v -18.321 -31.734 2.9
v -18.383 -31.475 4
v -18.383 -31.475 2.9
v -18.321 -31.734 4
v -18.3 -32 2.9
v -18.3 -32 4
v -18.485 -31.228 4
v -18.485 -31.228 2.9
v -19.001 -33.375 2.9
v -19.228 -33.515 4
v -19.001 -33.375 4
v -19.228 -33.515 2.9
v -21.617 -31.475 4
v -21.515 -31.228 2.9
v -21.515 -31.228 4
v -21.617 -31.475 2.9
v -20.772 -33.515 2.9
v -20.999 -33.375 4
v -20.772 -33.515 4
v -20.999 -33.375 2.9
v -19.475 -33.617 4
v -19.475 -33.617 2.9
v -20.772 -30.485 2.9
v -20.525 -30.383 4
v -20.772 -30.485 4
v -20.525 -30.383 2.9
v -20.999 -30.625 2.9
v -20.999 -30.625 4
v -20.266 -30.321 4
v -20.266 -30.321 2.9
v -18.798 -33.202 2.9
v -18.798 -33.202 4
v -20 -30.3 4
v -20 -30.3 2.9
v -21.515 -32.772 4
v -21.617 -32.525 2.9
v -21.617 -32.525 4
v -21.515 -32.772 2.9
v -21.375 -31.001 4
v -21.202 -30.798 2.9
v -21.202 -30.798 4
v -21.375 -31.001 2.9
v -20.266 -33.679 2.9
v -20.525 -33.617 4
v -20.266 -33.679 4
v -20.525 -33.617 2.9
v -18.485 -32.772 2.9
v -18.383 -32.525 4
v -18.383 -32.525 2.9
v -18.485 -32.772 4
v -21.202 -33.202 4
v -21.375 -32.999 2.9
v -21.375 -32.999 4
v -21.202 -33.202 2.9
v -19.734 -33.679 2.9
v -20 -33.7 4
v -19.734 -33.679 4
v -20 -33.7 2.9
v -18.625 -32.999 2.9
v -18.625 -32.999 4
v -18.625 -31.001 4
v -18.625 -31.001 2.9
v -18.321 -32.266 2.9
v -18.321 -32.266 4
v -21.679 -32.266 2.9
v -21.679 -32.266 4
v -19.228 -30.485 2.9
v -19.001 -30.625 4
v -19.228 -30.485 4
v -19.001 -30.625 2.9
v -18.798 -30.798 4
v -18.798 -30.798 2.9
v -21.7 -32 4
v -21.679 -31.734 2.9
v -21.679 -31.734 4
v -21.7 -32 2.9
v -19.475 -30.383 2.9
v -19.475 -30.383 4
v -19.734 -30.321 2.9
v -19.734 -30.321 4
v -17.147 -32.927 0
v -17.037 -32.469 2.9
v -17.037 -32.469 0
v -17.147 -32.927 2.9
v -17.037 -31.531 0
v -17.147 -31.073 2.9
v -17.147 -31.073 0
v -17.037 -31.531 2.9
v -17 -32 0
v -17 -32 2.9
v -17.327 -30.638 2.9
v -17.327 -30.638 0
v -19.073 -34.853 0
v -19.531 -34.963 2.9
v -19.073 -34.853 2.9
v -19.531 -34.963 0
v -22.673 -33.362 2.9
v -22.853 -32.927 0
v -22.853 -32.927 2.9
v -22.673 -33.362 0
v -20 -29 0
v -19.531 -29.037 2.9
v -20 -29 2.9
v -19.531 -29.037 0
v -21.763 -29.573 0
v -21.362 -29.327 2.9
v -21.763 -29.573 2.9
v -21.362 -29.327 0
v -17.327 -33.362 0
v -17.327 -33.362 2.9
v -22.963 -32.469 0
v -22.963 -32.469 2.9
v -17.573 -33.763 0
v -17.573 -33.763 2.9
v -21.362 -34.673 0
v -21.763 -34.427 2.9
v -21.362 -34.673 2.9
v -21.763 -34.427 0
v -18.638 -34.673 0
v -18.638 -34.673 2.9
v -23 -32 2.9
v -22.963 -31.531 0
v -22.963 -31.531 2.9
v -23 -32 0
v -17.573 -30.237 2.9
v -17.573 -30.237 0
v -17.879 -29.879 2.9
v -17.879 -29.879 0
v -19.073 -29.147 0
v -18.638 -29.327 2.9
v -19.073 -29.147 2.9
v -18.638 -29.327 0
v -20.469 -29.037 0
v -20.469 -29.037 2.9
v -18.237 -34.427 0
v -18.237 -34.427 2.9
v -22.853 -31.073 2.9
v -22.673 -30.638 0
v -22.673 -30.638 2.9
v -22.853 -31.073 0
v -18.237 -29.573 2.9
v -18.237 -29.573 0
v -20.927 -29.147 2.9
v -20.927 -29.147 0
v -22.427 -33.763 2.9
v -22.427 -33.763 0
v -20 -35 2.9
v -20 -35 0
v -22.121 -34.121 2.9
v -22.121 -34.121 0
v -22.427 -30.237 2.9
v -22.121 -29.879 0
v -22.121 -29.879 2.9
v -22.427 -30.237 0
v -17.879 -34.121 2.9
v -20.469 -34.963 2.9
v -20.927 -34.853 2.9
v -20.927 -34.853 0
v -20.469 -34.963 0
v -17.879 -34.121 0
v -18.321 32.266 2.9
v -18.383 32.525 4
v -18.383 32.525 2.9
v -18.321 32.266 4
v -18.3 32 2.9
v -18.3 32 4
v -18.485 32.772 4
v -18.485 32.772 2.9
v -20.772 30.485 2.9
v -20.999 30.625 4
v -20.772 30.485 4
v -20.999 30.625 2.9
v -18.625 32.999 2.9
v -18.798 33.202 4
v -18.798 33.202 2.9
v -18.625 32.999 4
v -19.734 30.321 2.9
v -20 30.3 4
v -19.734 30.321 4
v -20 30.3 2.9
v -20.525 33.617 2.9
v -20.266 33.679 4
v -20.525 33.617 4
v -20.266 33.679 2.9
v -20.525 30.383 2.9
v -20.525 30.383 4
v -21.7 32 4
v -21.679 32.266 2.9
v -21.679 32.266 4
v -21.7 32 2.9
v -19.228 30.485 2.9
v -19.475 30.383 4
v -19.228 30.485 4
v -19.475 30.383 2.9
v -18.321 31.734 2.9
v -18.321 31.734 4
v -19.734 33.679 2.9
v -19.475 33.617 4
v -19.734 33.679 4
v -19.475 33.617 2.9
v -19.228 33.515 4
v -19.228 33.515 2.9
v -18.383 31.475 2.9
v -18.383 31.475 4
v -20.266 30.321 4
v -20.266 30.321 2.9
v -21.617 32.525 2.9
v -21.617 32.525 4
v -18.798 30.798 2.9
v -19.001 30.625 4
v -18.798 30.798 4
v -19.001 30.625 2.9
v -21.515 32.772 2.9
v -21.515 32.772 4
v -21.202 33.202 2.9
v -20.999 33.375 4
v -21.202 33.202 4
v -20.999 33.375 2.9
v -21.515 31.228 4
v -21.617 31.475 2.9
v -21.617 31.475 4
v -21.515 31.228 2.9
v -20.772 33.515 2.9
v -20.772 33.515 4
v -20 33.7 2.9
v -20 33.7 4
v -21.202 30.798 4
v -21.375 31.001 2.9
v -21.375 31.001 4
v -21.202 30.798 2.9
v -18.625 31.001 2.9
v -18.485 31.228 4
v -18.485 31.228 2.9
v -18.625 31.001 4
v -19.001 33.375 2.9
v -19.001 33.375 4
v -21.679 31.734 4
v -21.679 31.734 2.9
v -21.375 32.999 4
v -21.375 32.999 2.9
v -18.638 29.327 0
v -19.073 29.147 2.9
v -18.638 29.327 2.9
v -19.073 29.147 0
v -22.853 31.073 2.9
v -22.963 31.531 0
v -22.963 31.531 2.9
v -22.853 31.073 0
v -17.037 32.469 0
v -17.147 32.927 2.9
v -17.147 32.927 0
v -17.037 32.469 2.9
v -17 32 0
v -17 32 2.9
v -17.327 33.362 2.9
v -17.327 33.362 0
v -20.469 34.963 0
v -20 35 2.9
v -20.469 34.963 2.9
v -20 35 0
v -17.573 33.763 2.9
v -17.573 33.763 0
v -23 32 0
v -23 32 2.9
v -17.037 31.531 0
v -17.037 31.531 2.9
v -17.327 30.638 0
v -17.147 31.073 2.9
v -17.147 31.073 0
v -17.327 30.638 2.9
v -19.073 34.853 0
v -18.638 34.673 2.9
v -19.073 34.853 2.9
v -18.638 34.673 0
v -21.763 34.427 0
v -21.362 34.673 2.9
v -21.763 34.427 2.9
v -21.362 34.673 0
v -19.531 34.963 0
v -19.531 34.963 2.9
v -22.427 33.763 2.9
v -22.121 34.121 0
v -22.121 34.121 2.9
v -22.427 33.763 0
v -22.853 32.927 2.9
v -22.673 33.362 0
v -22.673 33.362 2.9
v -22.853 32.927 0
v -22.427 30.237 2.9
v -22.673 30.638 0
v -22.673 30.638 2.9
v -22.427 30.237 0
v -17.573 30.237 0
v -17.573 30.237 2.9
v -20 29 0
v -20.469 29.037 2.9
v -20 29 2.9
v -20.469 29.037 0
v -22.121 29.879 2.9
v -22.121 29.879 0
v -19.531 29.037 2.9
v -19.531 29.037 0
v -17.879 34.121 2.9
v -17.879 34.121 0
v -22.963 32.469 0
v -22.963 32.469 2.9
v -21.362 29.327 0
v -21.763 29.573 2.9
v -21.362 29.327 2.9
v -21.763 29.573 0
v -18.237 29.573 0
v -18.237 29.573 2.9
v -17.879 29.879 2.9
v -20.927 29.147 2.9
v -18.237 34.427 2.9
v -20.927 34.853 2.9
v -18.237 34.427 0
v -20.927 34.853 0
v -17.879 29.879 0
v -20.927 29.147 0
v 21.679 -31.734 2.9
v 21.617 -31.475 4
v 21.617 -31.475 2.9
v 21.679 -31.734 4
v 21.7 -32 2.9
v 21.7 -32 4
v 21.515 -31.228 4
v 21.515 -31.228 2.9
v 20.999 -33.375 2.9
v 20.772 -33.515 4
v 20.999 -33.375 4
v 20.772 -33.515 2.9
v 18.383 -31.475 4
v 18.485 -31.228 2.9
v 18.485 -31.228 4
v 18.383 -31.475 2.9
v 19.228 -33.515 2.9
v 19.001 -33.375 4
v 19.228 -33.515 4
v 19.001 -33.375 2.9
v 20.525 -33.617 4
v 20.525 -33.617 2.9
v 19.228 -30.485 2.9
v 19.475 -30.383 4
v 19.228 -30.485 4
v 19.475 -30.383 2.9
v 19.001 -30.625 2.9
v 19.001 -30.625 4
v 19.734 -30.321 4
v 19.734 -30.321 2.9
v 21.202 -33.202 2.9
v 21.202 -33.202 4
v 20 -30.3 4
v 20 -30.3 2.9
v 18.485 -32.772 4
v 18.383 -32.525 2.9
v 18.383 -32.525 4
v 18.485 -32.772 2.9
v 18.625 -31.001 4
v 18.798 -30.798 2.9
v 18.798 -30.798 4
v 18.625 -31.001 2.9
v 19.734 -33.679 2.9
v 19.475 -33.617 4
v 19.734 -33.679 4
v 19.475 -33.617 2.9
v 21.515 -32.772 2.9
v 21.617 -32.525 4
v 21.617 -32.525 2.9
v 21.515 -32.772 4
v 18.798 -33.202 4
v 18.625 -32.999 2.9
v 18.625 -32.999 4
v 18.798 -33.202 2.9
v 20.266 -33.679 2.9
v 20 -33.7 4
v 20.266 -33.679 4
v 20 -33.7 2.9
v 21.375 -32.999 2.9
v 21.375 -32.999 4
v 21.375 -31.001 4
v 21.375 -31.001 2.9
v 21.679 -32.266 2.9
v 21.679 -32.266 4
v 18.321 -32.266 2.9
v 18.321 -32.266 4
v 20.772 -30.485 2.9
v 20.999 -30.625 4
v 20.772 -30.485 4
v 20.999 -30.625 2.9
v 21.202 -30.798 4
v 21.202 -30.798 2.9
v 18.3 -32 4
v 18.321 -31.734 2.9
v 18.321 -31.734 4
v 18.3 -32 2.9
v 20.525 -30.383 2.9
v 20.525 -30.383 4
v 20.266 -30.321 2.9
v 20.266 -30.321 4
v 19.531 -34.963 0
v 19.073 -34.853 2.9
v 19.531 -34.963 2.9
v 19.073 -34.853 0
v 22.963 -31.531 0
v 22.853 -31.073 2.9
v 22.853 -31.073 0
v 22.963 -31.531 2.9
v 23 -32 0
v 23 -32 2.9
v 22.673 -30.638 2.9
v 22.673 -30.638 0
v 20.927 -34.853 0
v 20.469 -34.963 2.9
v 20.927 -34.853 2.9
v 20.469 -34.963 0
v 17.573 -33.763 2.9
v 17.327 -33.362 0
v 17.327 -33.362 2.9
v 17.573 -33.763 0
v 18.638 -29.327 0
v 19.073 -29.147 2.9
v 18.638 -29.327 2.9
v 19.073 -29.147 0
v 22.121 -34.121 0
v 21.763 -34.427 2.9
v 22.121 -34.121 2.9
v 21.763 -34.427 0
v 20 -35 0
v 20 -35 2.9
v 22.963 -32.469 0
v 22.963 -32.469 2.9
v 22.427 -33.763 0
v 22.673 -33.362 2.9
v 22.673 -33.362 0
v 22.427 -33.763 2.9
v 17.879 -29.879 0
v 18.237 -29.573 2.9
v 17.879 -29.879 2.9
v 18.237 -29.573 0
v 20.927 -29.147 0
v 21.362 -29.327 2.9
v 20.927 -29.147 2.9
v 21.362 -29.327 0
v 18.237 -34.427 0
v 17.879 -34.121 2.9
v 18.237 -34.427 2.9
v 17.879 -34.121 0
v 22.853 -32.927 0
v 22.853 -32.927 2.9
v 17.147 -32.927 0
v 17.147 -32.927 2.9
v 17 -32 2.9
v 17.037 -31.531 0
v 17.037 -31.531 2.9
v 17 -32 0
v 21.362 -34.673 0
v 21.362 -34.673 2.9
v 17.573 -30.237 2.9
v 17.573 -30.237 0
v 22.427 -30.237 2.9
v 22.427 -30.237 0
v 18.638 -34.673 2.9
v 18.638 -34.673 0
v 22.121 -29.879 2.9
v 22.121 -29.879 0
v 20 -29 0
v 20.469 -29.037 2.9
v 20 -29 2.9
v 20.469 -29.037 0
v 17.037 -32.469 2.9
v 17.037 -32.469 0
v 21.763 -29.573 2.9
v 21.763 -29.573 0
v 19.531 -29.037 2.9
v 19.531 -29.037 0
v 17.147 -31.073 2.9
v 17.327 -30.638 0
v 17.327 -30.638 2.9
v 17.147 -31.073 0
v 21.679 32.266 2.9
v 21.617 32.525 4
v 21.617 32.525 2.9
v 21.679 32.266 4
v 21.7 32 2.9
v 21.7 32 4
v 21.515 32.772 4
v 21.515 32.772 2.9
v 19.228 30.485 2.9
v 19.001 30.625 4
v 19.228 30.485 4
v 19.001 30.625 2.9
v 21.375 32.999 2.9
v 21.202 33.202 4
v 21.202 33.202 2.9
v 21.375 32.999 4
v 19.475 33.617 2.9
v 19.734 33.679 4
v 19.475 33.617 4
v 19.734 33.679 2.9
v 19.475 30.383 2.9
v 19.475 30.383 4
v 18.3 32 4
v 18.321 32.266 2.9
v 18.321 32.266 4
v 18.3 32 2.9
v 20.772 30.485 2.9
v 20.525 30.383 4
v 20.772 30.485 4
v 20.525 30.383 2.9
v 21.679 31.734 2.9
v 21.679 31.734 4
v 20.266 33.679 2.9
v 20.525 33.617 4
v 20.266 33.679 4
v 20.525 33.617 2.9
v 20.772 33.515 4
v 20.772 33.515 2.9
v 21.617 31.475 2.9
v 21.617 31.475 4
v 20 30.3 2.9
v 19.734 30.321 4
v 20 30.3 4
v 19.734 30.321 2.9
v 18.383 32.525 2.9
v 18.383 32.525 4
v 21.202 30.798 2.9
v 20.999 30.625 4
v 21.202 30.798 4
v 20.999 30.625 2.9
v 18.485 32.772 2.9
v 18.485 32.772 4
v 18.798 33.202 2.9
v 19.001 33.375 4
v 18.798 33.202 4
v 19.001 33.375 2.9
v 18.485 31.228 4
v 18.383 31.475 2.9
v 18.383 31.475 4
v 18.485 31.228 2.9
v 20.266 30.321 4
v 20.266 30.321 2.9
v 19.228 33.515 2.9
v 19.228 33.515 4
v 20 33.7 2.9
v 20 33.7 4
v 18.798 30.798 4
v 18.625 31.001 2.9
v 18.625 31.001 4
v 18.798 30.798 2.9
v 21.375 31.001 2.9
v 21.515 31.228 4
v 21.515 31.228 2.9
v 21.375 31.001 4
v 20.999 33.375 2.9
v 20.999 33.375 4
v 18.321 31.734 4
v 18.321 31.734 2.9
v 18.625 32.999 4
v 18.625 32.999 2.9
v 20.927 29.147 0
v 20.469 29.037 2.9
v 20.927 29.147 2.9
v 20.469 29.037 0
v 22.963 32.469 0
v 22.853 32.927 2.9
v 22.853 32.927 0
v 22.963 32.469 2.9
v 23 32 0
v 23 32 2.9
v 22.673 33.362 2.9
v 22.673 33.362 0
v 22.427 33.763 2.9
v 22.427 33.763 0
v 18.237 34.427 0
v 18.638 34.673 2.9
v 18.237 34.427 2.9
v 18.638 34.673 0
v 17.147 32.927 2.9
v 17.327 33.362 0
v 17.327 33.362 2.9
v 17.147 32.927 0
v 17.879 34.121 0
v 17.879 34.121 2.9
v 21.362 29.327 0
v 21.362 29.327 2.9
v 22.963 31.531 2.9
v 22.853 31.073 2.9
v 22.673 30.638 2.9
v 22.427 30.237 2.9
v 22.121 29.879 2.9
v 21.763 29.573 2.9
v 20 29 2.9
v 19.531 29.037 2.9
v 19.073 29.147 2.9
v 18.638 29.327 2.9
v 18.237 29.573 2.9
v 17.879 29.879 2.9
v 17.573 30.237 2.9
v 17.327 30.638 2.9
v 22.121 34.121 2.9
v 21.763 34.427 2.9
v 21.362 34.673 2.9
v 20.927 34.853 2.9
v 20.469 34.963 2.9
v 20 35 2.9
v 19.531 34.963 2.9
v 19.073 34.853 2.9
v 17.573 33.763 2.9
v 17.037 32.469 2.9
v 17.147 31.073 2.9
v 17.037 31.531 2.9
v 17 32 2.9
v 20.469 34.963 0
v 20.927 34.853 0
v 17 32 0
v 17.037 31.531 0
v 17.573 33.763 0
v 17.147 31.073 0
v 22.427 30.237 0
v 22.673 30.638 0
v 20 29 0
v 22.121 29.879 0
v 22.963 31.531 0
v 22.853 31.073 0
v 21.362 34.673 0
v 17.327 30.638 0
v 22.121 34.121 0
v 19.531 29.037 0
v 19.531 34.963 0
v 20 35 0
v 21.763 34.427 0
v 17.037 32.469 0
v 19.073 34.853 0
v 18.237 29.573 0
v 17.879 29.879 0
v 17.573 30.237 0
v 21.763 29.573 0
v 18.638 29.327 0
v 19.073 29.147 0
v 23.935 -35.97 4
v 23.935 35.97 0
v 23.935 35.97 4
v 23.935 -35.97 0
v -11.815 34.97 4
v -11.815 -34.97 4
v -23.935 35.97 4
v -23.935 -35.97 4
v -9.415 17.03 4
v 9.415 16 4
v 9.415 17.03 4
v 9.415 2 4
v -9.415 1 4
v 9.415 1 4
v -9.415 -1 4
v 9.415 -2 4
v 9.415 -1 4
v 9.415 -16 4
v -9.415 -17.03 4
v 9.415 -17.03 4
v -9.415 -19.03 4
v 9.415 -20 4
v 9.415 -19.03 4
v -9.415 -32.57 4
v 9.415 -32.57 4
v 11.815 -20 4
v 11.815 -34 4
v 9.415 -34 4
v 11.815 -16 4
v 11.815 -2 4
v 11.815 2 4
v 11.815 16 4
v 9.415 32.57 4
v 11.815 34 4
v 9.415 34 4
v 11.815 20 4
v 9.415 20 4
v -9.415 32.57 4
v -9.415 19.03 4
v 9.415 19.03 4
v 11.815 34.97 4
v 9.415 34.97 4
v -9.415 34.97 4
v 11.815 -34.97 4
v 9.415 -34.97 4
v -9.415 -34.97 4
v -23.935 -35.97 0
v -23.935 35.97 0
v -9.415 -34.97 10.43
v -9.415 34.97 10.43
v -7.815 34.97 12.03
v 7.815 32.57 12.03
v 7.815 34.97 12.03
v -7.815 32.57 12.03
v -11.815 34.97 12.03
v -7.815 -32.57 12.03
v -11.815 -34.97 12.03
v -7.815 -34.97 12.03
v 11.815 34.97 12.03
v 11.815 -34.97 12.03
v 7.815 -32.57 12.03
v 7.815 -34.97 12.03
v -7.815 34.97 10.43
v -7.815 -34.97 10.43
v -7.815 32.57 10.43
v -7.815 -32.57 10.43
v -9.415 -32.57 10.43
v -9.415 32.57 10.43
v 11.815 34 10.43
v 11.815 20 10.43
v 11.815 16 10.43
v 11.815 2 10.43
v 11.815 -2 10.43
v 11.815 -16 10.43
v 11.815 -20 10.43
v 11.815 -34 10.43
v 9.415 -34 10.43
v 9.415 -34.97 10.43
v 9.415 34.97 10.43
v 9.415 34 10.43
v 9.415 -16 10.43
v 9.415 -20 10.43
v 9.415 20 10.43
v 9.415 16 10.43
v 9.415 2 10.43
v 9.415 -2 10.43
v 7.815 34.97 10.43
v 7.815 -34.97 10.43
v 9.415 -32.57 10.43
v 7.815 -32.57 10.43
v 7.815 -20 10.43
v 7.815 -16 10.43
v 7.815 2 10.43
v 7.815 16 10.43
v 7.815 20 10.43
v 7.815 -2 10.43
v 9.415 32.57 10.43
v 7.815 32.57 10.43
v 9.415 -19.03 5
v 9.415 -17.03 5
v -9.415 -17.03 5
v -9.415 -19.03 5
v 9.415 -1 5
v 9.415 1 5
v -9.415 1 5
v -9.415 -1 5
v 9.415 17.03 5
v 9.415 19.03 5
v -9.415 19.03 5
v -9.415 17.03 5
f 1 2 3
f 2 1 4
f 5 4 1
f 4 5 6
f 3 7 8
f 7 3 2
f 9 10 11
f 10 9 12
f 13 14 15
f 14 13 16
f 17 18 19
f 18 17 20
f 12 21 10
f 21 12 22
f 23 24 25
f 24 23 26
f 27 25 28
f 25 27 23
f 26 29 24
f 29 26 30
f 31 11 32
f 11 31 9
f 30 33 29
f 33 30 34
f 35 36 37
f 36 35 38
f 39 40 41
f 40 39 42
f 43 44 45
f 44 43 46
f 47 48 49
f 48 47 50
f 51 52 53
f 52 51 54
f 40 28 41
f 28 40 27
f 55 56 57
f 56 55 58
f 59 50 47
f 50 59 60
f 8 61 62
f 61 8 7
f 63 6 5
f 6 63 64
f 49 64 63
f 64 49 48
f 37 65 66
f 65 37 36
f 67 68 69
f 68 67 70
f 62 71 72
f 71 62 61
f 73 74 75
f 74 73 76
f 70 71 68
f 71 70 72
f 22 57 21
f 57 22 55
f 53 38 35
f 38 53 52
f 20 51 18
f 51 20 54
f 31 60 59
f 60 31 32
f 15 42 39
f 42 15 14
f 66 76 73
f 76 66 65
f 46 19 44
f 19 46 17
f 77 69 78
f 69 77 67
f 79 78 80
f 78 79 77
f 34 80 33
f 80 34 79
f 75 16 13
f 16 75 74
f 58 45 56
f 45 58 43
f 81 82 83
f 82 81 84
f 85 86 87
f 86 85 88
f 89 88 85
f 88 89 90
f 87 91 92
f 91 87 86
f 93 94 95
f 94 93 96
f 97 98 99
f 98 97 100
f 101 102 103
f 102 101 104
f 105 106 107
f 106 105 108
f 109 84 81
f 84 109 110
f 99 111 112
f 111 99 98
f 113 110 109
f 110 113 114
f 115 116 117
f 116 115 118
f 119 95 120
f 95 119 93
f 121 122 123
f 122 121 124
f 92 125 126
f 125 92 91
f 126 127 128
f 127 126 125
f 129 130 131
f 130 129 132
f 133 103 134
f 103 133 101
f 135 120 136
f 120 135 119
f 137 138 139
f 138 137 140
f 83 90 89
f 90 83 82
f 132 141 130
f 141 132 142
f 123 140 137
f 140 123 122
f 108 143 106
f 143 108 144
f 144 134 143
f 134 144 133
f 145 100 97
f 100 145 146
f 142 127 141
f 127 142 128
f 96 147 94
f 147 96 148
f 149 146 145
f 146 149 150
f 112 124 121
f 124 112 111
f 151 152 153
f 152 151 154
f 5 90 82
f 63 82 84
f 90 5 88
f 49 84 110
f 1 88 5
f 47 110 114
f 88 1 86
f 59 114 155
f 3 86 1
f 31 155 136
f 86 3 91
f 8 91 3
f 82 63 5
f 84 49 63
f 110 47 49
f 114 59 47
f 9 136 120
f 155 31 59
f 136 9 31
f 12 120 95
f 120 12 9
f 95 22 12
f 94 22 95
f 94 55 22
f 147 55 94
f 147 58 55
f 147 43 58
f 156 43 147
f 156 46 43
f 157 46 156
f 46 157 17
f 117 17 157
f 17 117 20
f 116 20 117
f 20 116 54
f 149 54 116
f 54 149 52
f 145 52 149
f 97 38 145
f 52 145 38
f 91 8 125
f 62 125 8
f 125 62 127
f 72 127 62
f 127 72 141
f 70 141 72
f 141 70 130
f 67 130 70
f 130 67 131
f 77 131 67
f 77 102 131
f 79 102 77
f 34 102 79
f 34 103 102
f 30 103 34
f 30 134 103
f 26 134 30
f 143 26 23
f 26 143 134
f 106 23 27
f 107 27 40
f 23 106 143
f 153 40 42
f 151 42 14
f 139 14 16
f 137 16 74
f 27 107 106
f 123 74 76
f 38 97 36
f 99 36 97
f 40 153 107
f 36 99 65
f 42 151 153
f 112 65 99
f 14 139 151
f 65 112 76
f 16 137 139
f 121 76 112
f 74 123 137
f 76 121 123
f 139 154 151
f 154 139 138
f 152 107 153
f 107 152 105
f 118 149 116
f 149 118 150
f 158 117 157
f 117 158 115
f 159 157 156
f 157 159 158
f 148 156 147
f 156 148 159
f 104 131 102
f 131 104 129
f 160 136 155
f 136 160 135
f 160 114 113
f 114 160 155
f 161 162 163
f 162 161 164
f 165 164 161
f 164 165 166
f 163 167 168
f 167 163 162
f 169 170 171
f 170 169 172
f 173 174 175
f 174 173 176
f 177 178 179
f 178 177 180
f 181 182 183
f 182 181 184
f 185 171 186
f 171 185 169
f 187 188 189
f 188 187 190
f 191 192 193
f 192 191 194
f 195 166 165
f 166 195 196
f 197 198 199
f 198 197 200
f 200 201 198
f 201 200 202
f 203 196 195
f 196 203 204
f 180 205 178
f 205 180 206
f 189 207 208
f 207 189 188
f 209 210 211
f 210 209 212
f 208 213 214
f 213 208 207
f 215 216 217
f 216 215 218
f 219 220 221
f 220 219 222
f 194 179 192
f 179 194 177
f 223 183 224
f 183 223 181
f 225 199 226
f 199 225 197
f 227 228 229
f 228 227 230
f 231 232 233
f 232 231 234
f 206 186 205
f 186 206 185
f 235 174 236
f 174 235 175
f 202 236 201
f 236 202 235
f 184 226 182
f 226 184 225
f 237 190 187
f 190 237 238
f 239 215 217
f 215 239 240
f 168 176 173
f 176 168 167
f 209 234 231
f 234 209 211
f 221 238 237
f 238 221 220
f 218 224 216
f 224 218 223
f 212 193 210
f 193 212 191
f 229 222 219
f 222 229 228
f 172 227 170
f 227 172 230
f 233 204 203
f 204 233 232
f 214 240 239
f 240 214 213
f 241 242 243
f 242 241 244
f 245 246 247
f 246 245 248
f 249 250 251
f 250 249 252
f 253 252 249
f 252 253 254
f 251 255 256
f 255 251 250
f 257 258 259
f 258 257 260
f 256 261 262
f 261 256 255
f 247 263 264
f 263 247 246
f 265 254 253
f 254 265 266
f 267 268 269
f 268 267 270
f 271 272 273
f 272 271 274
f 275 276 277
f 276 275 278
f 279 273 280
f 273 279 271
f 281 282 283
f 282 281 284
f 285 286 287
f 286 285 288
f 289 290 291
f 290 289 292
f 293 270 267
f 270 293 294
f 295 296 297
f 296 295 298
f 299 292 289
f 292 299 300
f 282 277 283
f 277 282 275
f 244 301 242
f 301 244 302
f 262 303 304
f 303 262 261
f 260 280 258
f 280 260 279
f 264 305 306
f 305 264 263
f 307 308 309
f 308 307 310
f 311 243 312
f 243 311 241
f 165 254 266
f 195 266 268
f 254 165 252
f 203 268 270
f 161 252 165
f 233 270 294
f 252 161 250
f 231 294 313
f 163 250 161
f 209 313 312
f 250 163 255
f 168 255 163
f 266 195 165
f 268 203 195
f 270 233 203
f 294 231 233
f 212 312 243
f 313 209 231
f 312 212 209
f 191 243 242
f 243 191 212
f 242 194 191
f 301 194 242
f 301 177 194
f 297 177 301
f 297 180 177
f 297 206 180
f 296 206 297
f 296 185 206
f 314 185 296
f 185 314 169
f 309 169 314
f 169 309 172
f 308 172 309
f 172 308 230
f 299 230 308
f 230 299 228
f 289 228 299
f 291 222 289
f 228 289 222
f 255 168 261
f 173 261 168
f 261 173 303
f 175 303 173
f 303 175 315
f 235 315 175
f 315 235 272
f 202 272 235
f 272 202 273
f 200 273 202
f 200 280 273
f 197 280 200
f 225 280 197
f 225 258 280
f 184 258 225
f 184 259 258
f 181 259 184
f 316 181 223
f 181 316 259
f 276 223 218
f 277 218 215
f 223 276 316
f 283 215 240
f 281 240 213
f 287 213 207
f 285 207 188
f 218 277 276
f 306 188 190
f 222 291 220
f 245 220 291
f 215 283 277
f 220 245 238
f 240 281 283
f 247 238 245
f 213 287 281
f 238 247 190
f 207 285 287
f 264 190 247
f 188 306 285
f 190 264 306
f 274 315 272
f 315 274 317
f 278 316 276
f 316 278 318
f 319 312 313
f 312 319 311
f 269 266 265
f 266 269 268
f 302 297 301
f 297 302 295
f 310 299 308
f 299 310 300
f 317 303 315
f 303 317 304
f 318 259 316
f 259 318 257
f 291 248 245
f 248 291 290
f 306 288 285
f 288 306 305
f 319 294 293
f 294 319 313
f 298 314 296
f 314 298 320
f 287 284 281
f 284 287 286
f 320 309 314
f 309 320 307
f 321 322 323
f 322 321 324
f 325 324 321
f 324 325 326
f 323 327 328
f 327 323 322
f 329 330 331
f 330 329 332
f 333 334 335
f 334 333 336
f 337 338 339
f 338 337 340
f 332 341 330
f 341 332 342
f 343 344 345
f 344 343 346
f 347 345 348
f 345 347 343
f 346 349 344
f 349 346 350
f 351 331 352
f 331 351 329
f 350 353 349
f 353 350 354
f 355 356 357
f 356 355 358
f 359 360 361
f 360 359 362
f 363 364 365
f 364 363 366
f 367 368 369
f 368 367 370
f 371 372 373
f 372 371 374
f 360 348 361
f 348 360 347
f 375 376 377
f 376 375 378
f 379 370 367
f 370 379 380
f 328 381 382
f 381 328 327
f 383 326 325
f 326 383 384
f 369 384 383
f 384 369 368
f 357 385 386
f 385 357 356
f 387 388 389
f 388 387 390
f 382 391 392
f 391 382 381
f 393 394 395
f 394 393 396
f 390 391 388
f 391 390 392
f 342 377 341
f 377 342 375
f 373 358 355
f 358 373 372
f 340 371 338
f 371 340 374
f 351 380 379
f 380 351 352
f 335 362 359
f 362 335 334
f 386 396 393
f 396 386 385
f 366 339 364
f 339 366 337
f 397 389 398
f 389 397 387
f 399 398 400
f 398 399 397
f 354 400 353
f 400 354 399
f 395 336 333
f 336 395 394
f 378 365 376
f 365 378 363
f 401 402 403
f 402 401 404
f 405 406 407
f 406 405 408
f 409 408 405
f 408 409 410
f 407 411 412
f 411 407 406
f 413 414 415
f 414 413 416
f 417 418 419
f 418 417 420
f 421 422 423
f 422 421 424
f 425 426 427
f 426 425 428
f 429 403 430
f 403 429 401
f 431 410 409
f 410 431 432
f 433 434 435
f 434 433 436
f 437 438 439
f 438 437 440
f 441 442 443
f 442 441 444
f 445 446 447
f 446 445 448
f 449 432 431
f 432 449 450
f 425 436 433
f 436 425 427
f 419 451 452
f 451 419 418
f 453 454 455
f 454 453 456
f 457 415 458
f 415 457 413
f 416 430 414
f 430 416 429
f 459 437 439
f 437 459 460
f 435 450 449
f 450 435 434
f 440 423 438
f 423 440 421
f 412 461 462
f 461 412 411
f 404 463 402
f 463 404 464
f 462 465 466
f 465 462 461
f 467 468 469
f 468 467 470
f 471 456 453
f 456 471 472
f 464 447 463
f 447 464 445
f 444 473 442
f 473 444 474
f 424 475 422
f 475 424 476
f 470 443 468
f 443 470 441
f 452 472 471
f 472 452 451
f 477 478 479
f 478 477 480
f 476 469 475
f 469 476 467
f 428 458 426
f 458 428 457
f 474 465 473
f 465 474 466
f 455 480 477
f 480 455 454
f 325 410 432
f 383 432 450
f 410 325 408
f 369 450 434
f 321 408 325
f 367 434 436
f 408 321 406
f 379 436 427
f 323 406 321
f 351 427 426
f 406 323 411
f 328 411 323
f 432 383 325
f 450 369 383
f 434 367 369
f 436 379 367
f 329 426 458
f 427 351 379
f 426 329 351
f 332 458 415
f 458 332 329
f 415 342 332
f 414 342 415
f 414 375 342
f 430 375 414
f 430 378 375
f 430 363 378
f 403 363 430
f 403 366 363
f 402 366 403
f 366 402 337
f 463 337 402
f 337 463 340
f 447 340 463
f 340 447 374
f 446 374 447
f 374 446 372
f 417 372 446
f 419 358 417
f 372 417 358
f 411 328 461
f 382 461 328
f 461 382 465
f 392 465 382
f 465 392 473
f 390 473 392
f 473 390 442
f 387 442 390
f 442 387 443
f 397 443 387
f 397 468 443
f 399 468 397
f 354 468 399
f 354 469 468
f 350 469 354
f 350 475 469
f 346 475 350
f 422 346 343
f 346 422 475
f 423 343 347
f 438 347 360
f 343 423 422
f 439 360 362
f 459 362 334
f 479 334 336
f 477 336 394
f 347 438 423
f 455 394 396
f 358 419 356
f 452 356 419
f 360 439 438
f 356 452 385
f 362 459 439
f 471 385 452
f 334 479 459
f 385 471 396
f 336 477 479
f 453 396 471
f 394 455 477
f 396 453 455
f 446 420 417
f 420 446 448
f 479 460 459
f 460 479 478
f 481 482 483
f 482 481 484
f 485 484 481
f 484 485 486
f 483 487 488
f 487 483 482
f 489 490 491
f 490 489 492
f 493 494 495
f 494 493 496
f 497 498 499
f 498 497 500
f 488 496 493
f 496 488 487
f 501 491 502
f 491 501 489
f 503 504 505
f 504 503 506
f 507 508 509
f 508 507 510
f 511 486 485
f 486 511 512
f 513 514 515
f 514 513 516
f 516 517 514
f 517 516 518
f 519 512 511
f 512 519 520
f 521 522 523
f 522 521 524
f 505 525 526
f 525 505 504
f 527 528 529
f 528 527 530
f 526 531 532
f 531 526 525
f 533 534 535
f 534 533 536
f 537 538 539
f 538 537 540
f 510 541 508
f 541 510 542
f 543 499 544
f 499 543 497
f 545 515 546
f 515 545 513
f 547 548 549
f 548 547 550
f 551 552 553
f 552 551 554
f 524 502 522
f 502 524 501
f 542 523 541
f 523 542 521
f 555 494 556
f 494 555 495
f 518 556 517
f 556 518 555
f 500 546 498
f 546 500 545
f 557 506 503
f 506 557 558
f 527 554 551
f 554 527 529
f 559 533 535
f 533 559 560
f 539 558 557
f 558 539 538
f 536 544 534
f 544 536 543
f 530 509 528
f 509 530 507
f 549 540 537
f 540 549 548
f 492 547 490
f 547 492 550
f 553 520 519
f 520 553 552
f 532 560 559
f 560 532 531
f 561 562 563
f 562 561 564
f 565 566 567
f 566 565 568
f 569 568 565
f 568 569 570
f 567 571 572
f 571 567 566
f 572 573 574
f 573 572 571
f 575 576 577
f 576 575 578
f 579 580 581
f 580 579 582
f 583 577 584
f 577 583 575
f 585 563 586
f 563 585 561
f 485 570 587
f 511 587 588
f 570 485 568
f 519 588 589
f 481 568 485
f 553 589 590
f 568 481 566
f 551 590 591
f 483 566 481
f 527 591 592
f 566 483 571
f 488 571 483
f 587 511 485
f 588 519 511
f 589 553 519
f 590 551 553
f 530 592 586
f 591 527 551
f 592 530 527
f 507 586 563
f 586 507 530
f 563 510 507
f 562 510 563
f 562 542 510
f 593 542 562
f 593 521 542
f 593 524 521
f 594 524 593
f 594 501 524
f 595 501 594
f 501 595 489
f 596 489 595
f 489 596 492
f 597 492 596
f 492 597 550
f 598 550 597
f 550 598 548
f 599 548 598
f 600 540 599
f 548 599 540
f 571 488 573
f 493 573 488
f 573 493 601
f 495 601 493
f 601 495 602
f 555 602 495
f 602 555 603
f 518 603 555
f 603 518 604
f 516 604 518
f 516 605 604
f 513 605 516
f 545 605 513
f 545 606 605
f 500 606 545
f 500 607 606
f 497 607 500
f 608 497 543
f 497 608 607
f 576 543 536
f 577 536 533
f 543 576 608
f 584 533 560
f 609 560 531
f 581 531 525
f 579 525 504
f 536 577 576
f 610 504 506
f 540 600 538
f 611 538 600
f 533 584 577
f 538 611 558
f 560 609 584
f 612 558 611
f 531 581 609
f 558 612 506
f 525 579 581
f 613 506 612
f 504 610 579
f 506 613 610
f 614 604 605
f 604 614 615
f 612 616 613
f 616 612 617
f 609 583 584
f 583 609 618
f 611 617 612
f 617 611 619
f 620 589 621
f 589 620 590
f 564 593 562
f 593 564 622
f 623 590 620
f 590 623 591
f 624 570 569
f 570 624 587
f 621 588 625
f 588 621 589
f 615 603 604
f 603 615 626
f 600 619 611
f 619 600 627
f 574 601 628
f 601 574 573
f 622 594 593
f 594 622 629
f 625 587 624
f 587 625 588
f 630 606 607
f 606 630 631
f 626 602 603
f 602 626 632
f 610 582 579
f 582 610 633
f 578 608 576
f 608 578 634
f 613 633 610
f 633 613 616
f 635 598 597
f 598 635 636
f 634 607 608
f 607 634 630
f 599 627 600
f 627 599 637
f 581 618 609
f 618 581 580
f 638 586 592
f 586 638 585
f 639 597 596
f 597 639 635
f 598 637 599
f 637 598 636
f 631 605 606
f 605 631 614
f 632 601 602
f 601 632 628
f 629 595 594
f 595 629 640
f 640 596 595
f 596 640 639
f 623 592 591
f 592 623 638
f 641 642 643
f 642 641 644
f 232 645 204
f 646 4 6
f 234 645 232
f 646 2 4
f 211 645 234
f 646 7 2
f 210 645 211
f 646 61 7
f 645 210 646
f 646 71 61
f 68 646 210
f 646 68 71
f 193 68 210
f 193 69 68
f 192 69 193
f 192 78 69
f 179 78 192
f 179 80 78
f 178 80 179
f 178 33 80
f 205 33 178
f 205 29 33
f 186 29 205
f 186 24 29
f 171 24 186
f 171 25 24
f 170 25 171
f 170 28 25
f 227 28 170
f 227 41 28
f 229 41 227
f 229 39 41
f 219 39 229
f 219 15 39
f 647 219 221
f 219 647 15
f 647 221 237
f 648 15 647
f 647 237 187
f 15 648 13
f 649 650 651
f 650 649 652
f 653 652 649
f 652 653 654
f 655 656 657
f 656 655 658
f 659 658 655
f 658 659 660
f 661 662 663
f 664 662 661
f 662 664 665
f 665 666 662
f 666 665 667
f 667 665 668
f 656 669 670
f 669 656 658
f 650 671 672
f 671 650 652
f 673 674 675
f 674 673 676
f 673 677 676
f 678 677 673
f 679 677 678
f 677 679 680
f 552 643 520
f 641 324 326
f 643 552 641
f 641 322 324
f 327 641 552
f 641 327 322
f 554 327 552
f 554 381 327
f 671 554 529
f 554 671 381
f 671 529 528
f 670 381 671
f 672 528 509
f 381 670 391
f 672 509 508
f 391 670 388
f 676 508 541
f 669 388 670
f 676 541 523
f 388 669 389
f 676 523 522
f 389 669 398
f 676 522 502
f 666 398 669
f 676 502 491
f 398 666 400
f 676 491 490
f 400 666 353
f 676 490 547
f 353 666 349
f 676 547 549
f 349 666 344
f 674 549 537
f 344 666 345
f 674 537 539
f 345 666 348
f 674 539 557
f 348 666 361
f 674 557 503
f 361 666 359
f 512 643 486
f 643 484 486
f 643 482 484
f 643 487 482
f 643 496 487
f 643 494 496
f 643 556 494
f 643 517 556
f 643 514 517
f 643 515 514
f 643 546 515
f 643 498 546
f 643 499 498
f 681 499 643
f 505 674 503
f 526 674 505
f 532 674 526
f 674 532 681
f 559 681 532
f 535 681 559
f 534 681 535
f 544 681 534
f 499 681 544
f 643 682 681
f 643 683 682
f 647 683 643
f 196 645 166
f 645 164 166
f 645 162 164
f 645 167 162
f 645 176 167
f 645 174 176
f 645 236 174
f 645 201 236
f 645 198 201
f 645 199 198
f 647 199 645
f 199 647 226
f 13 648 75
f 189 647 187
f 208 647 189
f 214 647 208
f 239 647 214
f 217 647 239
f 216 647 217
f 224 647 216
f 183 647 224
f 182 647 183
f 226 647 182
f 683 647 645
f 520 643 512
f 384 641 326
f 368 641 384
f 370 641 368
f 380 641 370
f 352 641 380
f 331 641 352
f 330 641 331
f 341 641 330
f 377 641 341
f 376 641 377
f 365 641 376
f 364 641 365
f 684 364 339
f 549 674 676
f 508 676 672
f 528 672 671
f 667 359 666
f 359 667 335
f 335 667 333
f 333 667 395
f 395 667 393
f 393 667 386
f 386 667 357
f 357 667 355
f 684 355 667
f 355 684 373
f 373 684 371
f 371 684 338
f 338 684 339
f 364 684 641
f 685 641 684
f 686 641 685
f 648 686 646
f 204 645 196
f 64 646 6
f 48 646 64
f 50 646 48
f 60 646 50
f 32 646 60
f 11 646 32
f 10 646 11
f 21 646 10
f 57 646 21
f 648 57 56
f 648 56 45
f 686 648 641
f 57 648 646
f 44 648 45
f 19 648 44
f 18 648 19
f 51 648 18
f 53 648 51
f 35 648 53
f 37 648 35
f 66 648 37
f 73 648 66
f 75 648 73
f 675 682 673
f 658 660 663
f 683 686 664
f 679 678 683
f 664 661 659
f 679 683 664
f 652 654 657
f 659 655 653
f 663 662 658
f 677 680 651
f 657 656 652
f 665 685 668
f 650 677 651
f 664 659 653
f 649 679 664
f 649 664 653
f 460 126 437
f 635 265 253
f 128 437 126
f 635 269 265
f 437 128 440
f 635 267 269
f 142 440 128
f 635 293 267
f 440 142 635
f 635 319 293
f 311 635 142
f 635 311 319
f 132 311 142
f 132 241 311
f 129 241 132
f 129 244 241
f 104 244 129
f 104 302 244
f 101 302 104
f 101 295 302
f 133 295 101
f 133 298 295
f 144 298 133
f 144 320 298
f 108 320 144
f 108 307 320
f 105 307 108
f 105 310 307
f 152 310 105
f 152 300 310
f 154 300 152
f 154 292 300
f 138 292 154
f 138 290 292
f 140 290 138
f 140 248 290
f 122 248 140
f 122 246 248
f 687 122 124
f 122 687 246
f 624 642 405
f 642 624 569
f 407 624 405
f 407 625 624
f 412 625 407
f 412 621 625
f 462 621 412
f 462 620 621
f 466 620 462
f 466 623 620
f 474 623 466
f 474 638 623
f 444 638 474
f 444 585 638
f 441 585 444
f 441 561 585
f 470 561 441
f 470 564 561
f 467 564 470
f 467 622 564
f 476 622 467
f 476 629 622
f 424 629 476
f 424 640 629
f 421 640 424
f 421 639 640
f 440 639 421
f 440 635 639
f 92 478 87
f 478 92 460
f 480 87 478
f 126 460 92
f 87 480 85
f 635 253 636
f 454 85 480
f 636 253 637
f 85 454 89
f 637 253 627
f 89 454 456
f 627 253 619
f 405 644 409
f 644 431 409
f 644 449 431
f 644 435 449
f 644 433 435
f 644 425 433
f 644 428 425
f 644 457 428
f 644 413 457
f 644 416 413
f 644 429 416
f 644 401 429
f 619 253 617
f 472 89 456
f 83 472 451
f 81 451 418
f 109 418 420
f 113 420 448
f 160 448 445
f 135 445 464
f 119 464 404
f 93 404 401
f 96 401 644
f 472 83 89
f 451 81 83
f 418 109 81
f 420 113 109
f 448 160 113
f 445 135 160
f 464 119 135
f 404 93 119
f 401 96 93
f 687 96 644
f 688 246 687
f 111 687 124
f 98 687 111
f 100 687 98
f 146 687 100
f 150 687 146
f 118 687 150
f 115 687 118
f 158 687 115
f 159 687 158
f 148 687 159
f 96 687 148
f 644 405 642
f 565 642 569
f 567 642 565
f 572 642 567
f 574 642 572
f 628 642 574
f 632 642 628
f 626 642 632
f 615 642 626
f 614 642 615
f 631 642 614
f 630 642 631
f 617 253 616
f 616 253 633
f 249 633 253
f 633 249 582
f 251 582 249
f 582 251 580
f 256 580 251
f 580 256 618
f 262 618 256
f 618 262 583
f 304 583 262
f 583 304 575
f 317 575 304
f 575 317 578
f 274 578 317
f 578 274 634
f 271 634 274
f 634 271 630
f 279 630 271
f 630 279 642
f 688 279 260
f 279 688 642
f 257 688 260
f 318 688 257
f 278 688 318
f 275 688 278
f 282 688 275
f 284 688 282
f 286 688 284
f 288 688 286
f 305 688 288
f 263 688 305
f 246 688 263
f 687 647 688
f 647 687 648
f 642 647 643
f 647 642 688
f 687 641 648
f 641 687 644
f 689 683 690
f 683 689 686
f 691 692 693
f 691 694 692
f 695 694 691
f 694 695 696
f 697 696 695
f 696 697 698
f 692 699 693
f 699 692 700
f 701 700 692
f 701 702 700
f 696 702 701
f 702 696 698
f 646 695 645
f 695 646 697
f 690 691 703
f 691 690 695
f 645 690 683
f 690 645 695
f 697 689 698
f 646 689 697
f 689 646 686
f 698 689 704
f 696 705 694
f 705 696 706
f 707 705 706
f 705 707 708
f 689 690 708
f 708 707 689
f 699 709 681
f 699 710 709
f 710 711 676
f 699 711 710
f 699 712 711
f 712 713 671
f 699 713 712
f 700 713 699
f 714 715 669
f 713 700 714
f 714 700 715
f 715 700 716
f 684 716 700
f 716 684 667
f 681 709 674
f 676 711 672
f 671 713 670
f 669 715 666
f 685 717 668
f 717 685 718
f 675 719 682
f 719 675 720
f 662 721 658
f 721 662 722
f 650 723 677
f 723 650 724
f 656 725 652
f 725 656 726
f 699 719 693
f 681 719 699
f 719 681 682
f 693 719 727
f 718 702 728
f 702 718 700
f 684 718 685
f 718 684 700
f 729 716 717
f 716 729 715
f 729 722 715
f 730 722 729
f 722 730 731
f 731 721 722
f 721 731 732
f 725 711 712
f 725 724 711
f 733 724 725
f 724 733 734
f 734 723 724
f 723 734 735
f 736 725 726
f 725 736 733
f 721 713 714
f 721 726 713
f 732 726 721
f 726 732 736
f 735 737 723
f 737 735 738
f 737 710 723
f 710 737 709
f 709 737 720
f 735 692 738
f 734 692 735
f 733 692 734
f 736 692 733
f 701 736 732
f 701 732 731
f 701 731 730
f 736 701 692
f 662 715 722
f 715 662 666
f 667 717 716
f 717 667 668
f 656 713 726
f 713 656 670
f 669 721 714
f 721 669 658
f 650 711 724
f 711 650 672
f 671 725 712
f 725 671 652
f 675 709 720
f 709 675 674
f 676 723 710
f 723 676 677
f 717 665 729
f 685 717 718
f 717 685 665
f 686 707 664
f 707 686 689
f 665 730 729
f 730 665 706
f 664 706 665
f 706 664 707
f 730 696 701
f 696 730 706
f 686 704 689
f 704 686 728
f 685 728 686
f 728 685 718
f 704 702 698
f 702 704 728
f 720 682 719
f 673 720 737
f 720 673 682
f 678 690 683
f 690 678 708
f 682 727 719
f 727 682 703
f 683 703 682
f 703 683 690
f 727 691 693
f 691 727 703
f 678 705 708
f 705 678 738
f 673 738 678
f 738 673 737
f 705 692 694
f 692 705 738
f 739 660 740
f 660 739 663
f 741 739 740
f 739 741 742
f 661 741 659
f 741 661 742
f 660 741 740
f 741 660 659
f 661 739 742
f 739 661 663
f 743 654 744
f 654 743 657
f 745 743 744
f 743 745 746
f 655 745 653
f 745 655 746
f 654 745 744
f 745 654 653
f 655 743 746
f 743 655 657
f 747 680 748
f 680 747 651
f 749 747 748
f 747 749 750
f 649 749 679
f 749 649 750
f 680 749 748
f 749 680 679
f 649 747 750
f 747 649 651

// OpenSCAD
// ============================================================================
// CyberWing — WAGO snap plate (side-mounted, vertical)
// 4 WAGO connectors (18.03 L × 18.53 W × 8.03 H) press into a central snap
// channel and click under two flexible side rails (C-lips). Locating ridges
// between them, end stops top/bottom. Mount holes sit in the side margins,
// clear of the connectors. Mounts to a side frame's 4× M3 inserts (64×40) via
// 16 mm standoffs (separate). Print flat, snap rack UP.
// ============================================================================
$fn = 40;

PW = 47.87; PH = 71.94; T = 4;                  // plate W(X) × H(Y) × thick(Z)
MNT_X = 40; MNT_Y = 64; M3_CLR = 3.4; M3_CB_D = 6; M3_CB_H = 3;

// ---- connector (measured) ----
NC = 4;
CONN_W = 18.53;     // connector width across the rails (X)
CONN_L = 18.03;     // connector length along the column (Y), per slot
CONN_H = 8.03;      // connector depth out of the plate (snap height)
CLR = 0.3;          // press-fit clearance
LIP = 1.6; WALL_T = 2.4; LIP_T = 1.6; RIDGE_H = 1.0;
WIN_L = 14;                                       // wire-exit window length per bay (in the right rail)

CHAN = CONN_W + CLR;            // channel width between rails
railx = CHAN/2;                // inner face of each rail

// ---- plate + mount holes (in the side margins, counterbored on the front) ----
difference() {
  translate([-PW/2, -PH/2, 0]) cube([PW, PH, T]);
  for (sx=[-1,1], sy=[-1,1]) {
    translate([sx*MNT_X/2, sy*MNT_Y/2, -0.1]) cylinder(d=M3_CLR, h=T+0.2);
    translate([sx*MNT_X/2, sy*MNT_Y/2, -0.1]) cylinder(d=M3_CB_D, h=M3_CB_H);   // head counterbore on the BACK face
  }
}

// ---- two flexible side rails with inward snap lips ----
module rail(sx) {
  translate([sx*railx, -PH/2+1, T]) {
    translate([sx>0?0:-WALL_T, 0, 0]) cube([WALL_T, PH-2, CONN_H]);                 // wall
    translate([sx>0?-LIP:-WALL_T, 0, CONN_H-LIP_T]) cube([WALL_T+LIP, PH-2, LIP_T]); // top lip inward
  }
}
rail(-1);                                         // left rail (solid)
difference() {                                    // right rail with wire-exit windows (lip kept on posts)
  rail(1);
  for (by=[-27,-9,9,27])
    translate([railx-LIP-0.1, by-WIN_L/2, T-0.1]) cube([WALL_T+LIP+0.2, WIN_L, CONN_H-LIP_T+0.1]);
}

// ---- end stops (cap the column) ----
for (sy=[-1,1])
  translate([-railx, sy*(PH/2-1) - (sy>0?WALL_T:0), T]) cube([CHAN, WALL_T, CONN_H]);

// ---- locating ridges between the 4 connectors ----
for (i=[1:NC-1])
  translate([-railx, -2*CONN_L + i*CONN_L - 1, T]) cube([CHAN, 2, RIDGE_H]);
